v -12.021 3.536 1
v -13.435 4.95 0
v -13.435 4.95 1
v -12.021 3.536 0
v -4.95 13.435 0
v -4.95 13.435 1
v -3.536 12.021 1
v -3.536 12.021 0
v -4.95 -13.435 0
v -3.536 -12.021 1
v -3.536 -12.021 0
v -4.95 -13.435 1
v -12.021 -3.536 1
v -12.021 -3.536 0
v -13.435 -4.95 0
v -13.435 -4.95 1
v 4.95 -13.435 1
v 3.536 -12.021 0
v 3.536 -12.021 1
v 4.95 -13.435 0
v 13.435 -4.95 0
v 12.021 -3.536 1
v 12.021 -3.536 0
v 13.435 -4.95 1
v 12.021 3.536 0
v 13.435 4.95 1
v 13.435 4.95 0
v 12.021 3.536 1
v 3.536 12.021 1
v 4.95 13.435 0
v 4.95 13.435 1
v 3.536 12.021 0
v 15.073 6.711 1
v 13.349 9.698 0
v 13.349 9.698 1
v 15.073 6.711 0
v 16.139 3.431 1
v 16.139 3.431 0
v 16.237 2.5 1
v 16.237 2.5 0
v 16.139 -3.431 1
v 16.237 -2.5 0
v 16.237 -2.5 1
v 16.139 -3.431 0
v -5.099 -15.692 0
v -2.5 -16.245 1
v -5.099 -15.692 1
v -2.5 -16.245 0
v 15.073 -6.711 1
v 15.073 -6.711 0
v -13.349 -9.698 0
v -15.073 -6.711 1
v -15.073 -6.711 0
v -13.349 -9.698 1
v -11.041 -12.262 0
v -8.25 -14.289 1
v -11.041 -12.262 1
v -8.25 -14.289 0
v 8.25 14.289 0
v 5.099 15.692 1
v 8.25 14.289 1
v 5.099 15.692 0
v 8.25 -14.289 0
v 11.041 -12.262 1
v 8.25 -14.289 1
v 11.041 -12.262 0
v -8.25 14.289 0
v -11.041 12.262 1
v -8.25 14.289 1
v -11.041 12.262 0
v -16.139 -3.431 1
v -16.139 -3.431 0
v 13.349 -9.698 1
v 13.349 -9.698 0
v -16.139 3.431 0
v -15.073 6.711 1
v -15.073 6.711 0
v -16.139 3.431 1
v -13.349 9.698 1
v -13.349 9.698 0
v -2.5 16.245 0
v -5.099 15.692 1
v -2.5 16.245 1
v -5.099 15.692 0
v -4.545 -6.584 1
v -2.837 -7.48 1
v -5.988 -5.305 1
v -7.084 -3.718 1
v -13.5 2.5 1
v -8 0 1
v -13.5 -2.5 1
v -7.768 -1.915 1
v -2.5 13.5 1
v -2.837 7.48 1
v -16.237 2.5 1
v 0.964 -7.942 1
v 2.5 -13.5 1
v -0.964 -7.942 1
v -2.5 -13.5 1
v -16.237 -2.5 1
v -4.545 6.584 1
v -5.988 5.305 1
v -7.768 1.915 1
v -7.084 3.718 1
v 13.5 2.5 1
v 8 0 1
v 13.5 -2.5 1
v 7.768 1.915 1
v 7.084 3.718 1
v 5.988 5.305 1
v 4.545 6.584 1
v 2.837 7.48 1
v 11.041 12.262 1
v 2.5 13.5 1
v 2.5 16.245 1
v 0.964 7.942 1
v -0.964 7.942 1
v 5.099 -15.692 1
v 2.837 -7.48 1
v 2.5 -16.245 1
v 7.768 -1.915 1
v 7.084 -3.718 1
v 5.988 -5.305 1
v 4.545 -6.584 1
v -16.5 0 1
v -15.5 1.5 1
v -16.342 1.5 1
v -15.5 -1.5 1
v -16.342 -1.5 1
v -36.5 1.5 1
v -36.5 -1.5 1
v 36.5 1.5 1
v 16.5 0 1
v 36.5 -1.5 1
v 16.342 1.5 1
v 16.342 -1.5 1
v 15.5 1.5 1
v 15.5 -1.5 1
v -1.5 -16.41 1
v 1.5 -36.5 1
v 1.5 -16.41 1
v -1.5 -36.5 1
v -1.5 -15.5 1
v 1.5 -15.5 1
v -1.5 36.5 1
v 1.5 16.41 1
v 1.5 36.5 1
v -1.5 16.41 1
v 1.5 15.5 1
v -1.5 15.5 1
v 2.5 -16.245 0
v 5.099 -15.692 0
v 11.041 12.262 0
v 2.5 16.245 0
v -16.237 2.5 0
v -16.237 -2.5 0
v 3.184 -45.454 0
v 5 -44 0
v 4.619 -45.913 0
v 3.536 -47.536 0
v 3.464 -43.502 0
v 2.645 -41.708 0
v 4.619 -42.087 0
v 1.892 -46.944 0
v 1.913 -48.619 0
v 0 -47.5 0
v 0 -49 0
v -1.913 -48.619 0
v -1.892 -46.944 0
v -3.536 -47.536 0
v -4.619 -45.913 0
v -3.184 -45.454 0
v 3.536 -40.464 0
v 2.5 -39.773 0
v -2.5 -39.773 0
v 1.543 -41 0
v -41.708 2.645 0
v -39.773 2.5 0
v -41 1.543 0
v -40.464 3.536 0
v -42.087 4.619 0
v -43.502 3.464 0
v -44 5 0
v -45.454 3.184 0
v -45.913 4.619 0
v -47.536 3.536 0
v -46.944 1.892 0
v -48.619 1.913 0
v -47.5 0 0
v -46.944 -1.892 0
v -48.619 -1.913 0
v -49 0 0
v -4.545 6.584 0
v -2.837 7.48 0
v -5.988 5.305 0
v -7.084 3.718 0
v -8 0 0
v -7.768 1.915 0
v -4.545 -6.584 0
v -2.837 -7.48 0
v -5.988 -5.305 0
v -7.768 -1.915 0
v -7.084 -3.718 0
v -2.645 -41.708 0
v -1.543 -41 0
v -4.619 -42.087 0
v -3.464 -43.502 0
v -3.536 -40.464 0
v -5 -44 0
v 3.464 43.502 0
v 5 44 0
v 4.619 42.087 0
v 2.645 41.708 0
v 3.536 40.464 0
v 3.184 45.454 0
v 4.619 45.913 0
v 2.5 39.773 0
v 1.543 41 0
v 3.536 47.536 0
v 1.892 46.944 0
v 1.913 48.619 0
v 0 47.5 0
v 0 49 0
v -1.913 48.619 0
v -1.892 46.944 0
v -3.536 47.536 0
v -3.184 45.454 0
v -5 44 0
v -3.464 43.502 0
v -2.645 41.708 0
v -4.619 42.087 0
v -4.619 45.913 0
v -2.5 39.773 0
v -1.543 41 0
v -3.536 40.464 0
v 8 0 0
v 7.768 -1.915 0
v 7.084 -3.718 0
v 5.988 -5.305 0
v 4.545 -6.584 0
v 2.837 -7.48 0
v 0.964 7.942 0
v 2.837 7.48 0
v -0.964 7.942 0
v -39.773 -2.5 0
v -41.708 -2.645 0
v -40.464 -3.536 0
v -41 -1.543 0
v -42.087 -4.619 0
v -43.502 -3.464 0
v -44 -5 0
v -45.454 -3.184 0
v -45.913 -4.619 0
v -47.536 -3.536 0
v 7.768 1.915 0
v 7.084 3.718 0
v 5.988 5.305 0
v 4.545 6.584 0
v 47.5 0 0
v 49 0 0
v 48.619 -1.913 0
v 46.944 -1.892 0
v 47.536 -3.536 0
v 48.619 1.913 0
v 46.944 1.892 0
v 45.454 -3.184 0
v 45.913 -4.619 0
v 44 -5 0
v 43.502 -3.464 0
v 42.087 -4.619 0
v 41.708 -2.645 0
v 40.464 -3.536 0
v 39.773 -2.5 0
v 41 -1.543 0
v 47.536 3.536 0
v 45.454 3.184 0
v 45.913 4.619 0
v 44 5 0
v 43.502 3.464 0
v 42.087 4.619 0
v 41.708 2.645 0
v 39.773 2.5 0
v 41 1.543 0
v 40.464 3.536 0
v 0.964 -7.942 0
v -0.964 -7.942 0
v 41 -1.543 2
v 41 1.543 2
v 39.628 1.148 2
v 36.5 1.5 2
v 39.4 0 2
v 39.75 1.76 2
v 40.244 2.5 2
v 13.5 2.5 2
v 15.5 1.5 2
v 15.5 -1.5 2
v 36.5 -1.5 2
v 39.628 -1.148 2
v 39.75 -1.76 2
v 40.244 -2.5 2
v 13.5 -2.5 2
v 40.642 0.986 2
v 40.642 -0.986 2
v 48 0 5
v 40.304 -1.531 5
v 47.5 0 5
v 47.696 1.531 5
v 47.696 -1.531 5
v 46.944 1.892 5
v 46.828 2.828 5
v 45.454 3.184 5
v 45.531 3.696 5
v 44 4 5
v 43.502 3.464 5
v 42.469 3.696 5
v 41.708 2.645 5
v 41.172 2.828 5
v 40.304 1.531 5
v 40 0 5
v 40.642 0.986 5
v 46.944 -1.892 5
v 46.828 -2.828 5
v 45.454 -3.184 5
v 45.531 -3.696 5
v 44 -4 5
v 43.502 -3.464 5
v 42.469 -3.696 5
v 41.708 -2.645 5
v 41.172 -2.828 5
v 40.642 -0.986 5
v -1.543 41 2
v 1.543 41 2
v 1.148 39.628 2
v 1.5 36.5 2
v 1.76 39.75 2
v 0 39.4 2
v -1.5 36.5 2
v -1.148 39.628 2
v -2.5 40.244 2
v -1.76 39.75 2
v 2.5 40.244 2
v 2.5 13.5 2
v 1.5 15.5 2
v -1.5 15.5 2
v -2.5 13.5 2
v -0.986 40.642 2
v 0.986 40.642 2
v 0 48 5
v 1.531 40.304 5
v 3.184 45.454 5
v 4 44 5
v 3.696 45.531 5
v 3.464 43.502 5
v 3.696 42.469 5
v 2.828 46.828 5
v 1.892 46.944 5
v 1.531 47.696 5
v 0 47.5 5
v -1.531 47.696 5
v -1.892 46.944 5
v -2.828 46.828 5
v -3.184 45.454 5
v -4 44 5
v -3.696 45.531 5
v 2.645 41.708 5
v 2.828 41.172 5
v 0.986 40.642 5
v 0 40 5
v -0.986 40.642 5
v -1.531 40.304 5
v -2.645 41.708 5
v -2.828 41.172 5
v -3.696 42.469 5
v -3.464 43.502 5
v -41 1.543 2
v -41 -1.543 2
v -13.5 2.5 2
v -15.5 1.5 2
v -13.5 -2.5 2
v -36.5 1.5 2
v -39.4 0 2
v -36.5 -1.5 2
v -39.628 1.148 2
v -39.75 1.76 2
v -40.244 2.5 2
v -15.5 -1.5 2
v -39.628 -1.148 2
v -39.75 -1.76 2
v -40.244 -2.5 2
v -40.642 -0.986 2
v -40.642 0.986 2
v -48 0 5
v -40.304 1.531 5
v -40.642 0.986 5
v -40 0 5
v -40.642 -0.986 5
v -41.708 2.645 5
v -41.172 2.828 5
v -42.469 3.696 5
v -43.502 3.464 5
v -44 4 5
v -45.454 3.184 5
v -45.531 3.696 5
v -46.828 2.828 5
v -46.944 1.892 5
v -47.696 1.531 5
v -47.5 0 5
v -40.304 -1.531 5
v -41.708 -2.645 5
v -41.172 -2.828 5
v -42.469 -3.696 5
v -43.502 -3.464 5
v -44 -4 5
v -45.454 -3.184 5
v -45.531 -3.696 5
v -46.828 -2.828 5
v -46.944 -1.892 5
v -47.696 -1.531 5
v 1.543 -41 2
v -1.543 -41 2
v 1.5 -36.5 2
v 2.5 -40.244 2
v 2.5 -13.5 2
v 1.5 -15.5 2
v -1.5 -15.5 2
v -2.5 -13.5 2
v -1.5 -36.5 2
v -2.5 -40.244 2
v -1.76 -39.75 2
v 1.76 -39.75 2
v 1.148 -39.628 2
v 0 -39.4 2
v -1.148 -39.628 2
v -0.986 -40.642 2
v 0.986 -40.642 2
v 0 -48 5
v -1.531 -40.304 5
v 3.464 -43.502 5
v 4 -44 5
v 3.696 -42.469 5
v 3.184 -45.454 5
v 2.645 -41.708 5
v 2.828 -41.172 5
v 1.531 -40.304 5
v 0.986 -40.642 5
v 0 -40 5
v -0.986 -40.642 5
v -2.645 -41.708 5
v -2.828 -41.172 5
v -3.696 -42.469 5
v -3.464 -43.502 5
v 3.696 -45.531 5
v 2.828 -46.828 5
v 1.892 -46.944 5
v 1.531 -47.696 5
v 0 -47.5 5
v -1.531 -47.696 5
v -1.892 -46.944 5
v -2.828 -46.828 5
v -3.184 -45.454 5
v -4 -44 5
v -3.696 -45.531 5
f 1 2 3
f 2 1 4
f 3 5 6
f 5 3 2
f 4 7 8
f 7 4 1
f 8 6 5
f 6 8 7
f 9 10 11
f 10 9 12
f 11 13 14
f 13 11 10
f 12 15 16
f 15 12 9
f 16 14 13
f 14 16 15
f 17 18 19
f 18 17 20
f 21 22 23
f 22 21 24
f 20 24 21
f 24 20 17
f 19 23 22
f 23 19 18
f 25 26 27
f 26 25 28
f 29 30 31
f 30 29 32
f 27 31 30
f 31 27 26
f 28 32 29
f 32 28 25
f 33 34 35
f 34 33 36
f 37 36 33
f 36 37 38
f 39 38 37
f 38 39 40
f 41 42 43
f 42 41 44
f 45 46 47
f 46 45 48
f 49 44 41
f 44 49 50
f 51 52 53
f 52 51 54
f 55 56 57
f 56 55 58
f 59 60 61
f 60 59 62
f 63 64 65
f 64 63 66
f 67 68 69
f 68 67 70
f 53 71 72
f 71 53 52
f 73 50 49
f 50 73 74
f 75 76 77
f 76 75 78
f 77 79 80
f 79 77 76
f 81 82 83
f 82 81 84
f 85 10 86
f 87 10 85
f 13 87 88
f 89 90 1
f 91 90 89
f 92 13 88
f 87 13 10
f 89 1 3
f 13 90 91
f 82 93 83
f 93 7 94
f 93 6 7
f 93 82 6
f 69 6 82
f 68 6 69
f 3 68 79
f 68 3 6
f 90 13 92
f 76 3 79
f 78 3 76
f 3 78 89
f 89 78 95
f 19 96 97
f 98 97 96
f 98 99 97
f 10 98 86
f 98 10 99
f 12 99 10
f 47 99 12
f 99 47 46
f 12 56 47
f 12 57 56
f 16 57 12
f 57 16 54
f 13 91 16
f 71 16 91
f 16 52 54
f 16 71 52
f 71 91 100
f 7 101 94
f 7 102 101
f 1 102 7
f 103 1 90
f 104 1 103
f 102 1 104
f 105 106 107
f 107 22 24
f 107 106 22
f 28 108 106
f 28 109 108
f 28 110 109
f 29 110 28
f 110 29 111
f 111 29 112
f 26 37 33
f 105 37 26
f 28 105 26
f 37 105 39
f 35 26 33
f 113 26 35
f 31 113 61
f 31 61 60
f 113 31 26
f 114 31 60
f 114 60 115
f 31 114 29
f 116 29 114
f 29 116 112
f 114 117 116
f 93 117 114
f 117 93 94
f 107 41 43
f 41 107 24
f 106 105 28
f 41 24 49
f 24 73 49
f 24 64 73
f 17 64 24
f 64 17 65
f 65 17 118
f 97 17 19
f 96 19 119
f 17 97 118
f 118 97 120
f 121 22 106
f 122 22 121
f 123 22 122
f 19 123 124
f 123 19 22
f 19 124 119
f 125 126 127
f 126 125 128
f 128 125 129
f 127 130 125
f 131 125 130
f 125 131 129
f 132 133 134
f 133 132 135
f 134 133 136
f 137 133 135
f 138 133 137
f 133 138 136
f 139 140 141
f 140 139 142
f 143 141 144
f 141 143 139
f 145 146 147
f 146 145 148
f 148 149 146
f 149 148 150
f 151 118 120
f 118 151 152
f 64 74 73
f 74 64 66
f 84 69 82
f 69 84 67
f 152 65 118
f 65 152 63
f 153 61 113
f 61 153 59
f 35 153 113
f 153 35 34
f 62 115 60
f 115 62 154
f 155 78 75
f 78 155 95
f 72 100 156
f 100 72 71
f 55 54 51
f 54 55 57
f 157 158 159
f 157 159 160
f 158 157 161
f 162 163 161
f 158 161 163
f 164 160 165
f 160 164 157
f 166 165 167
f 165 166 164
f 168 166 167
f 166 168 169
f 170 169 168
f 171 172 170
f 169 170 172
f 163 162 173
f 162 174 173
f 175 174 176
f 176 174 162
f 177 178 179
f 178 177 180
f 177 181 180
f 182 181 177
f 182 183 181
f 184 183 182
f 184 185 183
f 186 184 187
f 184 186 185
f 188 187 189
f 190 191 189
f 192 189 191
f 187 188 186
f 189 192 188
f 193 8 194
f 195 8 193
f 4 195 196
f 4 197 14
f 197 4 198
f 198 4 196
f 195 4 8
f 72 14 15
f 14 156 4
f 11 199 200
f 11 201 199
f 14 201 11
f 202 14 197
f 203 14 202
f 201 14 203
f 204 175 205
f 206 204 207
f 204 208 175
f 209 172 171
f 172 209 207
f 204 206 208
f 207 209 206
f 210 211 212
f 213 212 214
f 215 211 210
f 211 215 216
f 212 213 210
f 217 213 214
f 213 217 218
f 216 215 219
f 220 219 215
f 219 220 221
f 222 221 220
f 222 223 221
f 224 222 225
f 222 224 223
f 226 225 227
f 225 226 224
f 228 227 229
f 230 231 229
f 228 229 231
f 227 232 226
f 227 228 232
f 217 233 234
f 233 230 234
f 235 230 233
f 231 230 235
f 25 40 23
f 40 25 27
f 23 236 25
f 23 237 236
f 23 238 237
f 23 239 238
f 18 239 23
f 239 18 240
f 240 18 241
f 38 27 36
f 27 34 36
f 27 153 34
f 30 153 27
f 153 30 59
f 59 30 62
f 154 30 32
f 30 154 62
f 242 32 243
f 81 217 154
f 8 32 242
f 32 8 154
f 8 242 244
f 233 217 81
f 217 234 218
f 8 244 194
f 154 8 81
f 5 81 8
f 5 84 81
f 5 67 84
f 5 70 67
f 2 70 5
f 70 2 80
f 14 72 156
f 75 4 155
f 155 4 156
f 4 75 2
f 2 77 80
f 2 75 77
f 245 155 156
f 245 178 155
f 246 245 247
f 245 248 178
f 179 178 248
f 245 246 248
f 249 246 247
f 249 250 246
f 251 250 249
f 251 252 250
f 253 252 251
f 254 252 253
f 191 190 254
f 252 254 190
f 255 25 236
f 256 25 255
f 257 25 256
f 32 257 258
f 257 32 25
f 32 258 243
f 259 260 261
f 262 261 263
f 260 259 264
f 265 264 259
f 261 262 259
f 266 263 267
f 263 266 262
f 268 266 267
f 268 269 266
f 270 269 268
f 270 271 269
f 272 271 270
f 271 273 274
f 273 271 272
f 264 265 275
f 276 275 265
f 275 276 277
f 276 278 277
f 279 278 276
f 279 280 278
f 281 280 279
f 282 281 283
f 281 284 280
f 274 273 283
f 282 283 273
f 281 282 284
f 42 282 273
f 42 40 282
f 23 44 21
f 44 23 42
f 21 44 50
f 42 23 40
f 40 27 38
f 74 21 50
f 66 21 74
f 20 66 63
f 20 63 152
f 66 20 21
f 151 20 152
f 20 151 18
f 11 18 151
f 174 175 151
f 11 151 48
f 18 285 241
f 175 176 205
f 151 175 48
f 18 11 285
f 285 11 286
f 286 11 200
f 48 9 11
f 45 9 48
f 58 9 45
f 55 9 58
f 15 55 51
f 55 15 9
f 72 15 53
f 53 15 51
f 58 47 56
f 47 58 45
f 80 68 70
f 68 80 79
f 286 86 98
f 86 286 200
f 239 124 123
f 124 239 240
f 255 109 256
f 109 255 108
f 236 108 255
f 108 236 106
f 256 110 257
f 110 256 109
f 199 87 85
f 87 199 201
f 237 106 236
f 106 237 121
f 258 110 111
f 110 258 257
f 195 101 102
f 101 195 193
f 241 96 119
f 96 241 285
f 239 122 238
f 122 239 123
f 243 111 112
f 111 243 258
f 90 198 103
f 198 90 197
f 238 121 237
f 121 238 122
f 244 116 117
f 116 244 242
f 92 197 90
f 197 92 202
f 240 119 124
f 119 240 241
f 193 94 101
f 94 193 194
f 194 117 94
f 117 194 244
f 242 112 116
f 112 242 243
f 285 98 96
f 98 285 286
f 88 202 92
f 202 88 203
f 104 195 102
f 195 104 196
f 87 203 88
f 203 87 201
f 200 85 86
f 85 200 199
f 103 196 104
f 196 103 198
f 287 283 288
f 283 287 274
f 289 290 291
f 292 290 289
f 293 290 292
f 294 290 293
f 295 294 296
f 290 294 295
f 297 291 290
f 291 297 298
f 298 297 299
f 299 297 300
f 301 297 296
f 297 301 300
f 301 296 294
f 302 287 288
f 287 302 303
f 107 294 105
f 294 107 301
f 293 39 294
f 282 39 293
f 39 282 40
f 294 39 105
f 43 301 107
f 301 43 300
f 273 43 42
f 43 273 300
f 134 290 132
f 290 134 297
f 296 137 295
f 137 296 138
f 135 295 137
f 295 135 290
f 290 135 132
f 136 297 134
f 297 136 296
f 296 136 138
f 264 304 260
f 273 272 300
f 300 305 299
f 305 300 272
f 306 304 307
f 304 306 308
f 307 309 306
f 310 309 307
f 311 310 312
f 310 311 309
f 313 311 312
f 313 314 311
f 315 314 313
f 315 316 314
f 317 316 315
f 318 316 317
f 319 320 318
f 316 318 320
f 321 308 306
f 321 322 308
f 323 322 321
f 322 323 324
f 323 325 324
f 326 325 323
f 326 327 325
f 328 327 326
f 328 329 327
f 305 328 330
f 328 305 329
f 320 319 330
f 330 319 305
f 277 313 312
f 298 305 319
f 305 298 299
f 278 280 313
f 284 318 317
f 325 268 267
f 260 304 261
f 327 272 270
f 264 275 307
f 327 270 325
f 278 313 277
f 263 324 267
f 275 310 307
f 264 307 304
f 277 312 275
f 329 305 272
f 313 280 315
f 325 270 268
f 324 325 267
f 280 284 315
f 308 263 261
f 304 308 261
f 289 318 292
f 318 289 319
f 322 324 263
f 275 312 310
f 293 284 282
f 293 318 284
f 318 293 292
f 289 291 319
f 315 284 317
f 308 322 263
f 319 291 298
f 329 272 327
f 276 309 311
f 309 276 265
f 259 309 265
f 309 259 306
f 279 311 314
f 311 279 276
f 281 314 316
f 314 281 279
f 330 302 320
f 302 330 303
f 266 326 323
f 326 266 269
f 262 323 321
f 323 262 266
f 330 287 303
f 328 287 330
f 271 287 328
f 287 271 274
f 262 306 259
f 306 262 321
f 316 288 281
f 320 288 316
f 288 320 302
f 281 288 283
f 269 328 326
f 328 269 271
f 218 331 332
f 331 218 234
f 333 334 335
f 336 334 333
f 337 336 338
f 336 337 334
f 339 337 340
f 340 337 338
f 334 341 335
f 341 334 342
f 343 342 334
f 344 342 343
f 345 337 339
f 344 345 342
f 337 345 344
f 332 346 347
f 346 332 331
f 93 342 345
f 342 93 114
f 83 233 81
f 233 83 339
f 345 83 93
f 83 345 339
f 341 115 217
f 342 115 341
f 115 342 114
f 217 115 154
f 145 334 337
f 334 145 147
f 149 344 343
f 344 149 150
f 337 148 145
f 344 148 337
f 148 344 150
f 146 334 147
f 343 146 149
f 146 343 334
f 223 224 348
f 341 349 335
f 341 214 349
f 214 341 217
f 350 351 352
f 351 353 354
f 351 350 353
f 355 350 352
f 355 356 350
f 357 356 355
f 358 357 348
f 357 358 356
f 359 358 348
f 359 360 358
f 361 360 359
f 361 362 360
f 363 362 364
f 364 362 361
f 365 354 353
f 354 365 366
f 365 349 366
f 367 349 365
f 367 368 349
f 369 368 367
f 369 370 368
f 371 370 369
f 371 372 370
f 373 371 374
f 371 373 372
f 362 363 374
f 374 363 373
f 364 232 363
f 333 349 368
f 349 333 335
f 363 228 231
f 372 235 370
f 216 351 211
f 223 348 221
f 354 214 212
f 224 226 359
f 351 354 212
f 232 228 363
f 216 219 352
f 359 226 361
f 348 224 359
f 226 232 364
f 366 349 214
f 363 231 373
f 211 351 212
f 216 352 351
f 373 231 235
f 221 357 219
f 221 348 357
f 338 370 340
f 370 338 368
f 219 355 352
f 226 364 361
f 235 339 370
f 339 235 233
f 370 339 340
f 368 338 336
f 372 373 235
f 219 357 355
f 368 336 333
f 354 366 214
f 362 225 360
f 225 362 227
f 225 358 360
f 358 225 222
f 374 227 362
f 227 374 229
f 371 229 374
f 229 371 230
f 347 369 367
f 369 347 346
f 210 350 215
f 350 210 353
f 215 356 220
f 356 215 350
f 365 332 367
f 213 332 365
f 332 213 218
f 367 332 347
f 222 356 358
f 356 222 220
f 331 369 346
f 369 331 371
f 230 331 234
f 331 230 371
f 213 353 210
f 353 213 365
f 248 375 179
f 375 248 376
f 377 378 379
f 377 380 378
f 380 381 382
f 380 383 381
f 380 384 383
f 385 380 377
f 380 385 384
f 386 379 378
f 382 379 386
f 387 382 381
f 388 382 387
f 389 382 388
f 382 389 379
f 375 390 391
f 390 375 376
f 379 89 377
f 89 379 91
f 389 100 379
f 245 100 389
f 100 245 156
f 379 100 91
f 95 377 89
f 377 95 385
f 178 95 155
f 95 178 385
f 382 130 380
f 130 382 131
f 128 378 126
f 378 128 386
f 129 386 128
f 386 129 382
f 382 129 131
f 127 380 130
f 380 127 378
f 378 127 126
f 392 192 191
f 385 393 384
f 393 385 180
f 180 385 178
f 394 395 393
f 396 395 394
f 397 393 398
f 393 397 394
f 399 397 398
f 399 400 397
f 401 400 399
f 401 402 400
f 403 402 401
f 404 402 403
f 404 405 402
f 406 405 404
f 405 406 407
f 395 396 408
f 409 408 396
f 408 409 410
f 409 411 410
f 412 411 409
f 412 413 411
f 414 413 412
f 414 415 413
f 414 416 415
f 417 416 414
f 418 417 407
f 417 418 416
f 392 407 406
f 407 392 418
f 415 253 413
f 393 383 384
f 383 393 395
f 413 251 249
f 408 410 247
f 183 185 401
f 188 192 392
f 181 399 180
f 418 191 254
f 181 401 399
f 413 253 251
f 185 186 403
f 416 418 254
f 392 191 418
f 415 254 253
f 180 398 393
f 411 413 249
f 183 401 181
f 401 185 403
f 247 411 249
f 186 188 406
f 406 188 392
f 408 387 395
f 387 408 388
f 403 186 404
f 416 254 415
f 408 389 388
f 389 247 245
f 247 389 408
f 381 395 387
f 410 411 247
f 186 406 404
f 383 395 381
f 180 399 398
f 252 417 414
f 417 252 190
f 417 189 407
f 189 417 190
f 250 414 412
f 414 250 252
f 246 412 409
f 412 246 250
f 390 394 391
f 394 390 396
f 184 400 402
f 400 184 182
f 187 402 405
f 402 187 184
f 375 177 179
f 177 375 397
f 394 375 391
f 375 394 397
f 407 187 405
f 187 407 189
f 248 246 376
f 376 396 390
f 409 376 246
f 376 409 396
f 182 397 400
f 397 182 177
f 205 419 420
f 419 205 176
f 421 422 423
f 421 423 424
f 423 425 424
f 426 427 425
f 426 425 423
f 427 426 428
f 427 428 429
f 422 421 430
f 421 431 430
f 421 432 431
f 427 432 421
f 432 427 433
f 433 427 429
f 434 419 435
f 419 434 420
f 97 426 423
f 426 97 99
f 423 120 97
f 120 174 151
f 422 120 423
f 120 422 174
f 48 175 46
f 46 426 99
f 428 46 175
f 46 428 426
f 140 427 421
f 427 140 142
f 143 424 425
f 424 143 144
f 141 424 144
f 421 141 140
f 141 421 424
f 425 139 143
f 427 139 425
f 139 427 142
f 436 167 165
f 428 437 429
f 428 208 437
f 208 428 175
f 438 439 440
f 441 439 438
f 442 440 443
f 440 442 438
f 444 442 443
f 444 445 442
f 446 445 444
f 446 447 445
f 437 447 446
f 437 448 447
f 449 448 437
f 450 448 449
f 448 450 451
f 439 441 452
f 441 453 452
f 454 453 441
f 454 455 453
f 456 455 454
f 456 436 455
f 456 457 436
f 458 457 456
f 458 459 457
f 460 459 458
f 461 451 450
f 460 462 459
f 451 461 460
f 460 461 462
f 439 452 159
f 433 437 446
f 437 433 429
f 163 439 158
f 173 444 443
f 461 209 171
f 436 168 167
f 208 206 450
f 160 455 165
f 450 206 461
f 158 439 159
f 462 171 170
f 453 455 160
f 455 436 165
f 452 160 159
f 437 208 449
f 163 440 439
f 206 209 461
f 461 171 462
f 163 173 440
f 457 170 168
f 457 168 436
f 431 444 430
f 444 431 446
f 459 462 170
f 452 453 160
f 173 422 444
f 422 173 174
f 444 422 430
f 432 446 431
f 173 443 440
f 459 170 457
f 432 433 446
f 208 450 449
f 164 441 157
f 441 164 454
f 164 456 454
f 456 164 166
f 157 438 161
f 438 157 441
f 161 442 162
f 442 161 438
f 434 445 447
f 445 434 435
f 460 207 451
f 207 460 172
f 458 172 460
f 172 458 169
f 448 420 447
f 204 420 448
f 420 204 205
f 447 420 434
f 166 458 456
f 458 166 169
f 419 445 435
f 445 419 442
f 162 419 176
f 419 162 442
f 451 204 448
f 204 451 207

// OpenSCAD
entraxe = 88;
thickness = 1;
plate = 33;



difference(){
	cylinder(h=1, r=plate/2);
	translate([0,0,-2.5])
		cylinder(h=5, r= 8);
	for( i = [ 0:90:360 ]){
		rotate([0,0,i+45]){
			translate([-6,12-thickness,-3]){
				cube([12,2*thickness,10]);
			}
		}
	}
}

pattes = 5;

// les 4 pattes
for( i=[0:90:360]){
	rotate([0,0,i]){
		translate([plate/2-3,-pattes/2,0]){
			difference() {							// nervure dans les pattes
				cube([entraxe/2-(plate/2), pattes, thickness*2]);
				translate([2,thickness,thickness])
					cube([entraxe/2-23, pattes - 2*thickness, 3*thickness]);
			}
		}
		translate([entraxe/2,0,0]){					// le cone support moteurs
			difference() {
				cylinder(h=5, r1 = 5, r2= 4);
				translate([0,0,-thickness])
					cylinder(h=5+2*thickness, r = 3.5);
			}
		}
	}
}
